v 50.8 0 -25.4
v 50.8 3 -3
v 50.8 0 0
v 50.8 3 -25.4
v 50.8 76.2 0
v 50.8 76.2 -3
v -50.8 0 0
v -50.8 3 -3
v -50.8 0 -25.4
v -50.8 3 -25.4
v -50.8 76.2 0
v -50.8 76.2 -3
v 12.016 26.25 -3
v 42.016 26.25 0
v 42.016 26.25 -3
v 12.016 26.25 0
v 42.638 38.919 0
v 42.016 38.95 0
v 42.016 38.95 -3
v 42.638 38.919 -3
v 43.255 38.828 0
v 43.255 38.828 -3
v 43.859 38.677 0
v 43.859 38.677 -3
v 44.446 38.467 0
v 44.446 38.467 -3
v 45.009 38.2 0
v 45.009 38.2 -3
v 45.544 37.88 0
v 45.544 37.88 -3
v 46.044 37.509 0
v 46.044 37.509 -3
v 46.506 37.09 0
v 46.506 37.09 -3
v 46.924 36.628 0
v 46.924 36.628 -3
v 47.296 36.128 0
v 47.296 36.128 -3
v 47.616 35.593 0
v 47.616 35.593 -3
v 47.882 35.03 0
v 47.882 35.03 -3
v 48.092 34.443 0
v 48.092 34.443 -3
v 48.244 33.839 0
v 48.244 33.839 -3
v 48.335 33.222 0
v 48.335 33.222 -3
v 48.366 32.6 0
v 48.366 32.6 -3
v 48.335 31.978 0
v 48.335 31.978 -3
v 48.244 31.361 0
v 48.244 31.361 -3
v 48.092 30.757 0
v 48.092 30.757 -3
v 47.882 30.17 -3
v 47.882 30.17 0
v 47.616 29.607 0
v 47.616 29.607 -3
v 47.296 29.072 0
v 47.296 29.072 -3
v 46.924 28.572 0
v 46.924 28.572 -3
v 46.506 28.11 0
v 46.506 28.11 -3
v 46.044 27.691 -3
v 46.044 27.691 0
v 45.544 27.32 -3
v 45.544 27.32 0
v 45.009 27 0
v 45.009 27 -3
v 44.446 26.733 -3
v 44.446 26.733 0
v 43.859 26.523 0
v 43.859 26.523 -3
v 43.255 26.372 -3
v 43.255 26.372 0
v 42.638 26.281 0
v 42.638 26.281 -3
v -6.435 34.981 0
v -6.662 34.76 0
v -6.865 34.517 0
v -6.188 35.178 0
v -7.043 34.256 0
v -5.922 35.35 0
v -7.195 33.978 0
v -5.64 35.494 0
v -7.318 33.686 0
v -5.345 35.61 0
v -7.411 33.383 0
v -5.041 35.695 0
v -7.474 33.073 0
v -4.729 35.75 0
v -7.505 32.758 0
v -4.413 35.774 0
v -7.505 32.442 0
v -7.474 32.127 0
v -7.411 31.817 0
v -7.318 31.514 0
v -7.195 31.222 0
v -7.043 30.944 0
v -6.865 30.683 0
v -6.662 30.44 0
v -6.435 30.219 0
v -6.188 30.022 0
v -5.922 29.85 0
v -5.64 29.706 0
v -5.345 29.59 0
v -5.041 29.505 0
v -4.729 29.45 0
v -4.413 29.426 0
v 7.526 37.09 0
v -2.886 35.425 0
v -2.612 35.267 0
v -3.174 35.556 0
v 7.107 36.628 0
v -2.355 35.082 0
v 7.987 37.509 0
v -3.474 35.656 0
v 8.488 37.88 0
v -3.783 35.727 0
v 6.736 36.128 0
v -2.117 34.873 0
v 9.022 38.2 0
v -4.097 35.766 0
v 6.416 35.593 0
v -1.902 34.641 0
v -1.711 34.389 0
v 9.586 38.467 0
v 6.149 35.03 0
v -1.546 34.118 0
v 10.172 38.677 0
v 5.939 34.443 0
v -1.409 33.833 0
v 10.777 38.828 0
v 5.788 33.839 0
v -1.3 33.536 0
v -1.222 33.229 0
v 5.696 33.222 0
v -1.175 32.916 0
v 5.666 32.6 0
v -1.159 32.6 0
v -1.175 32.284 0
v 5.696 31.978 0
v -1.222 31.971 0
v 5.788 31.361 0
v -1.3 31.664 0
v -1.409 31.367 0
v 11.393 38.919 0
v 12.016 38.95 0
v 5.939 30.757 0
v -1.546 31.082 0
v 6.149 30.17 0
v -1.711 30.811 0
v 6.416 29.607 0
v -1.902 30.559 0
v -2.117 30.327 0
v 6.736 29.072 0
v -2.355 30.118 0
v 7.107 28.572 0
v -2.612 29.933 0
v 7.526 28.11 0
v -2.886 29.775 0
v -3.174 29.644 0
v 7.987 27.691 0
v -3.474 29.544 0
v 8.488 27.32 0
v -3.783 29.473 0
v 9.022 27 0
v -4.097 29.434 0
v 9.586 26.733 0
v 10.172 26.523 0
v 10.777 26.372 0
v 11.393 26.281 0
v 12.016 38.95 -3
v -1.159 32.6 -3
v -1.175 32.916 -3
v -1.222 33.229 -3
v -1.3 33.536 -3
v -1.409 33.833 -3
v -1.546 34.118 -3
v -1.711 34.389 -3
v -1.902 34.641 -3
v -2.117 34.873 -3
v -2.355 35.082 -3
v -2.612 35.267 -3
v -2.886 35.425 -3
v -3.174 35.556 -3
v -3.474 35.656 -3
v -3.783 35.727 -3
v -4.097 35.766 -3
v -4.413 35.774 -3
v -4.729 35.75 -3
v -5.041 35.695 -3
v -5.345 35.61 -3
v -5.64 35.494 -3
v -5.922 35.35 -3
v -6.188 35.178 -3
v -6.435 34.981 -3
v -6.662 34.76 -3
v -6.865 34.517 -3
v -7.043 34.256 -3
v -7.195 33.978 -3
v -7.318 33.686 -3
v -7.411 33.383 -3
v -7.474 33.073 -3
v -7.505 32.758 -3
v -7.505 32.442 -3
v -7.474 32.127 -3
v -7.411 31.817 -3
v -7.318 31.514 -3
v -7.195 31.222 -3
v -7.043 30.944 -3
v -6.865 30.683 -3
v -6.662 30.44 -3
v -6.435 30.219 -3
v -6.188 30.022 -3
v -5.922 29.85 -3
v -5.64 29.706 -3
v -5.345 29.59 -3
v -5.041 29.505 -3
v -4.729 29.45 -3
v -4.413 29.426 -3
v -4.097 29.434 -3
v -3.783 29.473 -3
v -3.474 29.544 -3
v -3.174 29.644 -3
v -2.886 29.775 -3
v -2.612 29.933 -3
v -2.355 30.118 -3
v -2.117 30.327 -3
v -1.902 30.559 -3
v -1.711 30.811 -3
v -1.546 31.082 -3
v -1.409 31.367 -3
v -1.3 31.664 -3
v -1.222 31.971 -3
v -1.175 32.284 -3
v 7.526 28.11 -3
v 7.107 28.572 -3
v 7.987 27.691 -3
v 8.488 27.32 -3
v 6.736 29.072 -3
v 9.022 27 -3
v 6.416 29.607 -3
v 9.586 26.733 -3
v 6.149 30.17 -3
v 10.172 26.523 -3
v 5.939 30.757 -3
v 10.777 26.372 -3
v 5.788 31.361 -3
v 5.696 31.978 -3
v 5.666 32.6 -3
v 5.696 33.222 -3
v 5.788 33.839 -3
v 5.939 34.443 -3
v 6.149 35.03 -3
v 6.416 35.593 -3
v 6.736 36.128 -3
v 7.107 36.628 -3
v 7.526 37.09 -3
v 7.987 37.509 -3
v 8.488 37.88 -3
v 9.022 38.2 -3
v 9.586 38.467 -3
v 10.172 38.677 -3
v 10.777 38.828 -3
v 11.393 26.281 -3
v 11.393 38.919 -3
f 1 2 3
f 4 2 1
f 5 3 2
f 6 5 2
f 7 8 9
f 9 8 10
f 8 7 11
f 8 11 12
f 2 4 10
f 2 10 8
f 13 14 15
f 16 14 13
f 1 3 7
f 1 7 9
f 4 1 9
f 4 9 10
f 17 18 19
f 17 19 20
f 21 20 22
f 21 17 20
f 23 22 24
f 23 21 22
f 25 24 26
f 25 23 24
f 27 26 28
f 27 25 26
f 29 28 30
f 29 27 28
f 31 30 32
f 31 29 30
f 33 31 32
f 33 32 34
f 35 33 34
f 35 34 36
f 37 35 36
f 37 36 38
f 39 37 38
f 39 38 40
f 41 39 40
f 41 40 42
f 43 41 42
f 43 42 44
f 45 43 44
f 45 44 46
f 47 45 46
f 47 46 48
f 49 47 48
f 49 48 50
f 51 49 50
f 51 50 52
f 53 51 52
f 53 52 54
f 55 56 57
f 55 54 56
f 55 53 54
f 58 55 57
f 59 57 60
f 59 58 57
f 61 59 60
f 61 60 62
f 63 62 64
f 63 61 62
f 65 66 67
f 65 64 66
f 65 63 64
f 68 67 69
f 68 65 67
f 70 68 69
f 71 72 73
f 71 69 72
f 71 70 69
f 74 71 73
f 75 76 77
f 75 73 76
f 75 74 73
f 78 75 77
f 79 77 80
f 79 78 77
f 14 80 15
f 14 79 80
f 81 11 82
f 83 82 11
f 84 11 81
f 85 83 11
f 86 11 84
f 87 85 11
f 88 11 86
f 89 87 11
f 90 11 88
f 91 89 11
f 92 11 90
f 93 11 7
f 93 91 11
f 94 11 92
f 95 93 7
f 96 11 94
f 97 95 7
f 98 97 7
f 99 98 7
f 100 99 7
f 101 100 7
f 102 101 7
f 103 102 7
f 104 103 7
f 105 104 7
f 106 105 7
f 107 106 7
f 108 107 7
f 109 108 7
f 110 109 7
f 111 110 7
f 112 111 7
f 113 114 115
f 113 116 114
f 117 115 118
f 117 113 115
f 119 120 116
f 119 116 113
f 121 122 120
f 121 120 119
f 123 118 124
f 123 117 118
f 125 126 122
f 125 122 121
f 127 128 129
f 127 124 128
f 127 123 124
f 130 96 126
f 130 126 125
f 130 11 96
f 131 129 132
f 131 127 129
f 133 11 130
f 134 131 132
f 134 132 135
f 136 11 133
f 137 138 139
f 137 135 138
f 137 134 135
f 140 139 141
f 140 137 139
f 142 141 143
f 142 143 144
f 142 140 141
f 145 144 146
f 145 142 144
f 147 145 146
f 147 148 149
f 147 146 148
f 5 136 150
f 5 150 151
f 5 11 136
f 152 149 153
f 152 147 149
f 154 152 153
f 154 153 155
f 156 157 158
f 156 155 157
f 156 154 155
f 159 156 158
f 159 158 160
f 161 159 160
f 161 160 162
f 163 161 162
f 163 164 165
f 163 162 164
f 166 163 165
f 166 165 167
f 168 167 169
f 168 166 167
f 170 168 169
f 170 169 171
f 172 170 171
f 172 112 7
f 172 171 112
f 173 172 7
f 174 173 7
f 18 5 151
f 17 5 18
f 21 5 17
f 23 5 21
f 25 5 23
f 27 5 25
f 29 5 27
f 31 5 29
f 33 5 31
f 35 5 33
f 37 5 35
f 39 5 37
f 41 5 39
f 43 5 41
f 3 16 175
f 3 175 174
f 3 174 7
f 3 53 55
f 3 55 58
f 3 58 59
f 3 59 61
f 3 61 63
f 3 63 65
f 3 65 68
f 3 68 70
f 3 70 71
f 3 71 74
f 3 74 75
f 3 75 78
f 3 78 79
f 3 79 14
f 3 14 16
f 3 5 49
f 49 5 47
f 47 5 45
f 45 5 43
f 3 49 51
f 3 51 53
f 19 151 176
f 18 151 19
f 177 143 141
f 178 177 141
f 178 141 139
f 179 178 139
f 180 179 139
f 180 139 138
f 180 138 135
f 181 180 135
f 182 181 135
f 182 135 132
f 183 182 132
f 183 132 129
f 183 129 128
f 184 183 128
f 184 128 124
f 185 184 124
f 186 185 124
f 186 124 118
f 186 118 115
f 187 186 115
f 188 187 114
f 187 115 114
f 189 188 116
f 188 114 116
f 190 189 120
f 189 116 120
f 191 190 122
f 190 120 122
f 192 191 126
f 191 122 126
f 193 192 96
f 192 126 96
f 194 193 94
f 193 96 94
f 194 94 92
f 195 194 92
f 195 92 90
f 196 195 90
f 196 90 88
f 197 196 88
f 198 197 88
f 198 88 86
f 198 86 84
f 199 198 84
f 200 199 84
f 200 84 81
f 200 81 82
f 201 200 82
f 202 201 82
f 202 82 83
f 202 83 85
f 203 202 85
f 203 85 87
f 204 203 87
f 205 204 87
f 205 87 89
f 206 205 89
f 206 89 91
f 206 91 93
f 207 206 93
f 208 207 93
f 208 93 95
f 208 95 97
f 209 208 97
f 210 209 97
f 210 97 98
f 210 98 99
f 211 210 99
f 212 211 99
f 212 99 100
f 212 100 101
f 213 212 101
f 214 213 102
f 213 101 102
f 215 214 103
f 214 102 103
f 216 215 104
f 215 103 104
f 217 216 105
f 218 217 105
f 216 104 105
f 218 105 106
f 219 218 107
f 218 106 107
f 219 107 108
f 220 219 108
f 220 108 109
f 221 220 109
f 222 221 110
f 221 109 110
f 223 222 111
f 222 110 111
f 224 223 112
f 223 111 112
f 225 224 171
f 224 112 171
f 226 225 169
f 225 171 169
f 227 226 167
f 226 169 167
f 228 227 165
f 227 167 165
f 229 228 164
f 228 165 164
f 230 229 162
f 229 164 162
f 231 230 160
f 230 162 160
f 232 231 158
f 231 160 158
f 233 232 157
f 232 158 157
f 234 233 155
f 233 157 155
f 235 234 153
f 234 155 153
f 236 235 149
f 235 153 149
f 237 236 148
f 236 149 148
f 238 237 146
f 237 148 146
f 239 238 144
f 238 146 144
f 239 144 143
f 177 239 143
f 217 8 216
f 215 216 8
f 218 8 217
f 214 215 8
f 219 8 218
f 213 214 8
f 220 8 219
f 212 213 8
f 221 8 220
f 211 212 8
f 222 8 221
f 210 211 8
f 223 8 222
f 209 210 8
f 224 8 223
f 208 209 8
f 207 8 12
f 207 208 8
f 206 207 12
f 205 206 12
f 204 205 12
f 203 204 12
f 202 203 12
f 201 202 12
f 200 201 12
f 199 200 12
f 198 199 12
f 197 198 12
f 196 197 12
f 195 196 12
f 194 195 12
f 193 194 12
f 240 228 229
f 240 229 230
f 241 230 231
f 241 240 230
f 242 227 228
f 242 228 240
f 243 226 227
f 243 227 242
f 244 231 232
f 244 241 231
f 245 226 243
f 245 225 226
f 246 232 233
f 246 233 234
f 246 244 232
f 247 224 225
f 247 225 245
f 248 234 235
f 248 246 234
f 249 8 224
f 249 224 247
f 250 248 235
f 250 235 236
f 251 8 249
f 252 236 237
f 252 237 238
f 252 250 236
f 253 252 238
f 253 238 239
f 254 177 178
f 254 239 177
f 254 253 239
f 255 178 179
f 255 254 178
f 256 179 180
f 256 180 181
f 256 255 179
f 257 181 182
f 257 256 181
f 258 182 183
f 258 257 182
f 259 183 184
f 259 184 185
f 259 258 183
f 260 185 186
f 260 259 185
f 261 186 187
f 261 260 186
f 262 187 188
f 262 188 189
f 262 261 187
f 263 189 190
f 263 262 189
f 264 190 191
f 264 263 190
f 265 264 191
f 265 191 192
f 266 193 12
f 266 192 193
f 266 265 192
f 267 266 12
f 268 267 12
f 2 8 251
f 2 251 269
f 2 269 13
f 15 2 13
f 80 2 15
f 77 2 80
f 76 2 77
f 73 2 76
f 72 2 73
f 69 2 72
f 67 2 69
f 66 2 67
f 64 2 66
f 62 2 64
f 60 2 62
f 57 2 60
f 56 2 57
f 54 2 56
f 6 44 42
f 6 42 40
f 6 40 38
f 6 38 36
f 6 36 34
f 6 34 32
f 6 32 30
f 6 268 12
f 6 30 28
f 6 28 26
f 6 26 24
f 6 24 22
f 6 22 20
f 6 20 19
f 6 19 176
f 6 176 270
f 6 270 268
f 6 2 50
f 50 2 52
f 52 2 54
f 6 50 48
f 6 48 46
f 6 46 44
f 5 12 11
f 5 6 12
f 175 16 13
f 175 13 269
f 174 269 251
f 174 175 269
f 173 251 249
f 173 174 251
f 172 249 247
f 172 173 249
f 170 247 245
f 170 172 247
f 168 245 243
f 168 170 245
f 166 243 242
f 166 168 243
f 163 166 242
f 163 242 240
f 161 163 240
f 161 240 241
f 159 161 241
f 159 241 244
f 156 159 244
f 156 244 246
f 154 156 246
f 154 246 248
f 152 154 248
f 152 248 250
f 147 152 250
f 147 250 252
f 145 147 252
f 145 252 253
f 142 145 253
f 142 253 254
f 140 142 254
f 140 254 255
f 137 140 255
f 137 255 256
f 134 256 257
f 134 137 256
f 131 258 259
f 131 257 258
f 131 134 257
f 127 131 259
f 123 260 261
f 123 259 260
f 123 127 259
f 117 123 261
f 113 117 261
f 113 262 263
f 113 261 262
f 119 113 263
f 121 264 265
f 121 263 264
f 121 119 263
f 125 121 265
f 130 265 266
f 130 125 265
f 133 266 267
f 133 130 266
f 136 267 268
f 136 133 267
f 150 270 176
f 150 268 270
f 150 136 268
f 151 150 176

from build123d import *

# Parameters (mm, degrees)
SALIENTE_EXTRUIR1_DEPTH = 50.8
CROQUIS2_R              = 3.175
CORTAR_EXTRUIR1_DEPTH   = 96.038097624


with BuildPart() as part:
    # Croquis1 → Saliente-Extruir1 (new, symmetric)
    with BuildSketch(Plane(origin=(0, 0, 0), x_dir=(0, 0, -1), z_dir=(1, 0, 0))):
        Polygon((0, 76.2), (0, 0), (25.4, 0), (25.4, 3), (3, 3), (3, 76.2), align=None)
    extrude(amount=SALIENTE_EXTRUIR1_DEPTH, both=True)

    # Croquis2 → Cortar-Extruir1 (cut, through all)
    with BuildSketch(Plane.XY):
        with Locations((-4.334249313, 32.6)):
            Circle(CROQUIS2_R)
        with BuildLine():
            Line((42.015750687, 26.25), (12.015750687, 26.25))
            ThreePointArc((12.015750687, 26.25), (5.665750687, 32.6), (12.015750687, 38.95))
            Line((12.015750687, 38.95), (42.015750687, 38.95))
            ThreePointArc((42.015750687, 38.95), (48.365750687, 32.6), (42.015750687, 26.25))
        make_face()
    extrude(amount=-CORTAR_EXTRUIR1_DEPTH, mode=Mode.SUBTRACT)


solid = part.part
